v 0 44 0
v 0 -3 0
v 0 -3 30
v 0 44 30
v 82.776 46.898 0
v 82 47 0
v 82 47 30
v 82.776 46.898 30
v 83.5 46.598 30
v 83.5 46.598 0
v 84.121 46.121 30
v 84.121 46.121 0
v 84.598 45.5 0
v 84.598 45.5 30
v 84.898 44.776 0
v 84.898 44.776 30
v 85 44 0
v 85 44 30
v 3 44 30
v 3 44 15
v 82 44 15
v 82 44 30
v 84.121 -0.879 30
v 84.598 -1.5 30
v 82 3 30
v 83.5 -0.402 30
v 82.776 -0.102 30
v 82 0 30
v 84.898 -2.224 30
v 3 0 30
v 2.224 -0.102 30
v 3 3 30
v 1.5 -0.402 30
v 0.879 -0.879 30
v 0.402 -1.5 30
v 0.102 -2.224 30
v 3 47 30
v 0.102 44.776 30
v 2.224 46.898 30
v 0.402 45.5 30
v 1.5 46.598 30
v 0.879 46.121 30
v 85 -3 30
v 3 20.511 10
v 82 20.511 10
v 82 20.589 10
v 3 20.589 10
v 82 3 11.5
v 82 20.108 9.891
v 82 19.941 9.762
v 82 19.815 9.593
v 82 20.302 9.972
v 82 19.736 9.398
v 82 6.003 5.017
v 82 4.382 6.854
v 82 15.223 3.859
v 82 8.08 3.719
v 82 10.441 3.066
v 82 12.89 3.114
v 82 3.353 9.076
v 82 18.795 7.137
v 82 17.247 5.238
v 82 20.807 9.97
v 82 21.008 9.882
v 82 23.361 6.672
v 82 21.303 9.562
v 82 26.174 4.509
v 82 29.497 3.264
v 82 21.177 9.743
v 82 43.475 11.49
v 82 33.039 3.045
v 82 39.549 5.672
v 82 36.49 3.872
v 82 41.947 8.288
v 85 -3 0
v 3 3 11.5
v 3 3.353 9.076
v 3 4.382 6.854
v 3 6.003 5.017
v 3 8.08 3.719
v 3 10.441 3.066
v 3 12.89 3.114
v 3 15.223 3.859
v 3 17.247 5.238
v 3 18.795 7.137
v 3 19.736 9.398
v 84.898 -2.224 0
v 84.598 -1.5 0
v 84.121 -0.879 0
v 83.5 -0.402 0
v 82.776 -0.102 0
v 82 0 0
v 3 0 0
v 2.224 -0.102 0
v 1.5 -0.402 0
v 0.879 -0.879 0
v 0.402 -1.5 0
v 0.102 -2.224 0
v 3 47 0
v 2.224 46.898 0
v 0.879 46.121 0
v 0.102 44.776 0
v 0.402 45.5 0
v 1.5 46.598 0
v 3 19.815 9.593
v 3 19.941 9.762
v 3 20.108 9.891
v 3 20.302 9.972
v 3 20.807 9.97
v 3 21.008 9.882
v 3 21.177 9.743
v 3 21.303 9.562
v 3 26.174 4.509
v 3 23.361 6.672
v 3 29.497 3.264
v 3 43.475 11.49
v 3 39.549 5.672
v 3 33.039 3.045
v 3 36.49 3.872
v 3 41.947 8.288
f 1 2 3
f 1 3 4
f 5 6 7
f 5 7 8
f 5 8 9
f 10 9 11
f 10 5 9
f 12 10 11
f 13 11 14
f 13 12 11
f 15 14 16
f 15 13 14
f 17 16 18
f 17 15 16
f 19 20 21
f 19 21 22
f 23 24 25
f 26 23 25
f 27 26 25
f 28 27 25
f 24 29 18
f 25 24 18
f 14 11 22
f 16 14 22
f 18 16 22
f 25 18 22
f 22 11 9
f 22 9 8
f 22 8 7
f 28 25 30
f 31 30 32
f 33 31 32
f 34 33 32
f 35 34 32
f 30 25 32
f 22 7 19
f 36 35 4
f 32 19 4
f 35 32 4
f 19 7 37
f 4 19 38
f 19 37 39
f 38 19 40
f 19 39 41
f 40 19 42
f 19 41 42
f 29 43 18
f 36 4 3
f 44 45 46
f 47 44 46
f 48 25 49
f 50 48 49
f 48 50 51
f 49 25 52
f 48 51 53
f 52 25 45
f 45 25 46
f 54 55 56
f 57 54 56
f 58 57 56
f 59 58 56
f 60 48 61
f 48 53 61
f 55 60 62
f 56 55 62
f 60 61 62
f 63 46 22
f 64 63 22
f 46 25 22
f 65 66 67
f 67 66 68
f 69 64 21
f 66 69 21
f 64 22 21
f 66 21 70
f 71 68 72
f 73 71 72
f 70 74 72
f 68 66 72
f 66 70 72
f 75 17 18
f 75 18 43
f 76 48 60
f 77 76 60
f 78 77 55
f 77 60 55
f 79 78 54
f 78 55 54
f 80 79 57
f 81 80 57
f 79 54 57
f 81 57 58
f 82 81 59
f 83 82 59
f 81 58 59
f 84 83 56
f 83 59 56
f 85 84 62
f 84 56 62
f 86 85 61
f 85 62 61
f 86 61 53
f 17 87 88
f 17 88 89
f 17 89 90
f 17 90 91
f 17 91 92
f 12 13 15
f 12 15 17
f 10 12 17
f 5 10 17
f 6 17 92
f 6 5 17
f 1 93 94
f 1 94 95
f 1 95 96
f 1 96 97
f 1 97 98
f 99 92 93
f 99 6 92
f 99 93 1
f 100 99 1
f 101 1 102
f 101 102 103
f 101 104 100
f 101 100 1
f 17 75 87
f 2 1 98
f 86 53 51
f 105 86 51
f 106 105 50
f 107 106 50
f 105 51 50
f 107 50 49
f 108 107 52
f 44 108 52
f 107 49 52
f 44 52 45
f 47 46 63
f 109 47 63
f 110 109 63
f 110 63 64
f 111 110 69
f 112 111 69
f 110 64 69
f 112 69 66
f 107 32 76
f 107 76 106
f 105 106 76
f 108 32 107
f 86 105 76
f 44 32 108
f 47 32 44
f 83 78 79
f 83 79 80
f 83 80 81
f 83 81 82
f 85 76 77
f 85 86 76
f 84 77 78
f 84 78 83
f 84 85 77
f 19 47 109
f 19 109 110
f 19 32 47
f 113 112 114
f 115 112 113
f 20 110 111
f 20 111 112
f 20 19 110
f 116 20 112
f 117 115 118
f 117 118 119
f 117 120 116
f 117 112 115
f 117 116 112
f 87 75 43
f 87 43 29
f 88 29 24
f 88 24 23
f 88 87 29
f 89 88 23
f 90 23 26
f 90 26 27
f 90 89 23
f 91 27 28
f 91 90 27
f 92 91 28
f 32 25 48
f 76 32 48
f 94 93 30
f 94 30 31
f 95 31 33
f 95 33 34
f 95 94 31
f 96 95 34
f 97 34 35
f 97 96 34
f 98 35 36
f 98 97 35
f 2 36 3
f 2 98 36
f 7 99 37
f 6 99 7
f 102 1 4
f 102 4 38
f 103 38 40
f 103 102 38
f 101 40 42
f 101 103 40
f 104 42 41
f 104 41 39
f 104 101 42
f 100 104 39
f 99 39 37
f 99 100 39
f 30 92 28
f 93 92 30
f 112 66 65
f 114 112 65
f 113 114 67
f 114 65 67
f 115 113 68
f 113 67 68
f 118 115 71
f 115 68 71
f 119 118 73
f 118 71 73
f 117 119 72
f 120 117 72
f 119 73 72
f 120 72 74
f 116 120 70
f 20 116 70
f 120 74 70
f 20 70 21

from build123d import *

# Parameters (mm, degrees)
BOSS_EXTRUDE1_DEPTH = 30
CUT_EXTRUDE1_START  = -3
CUT_EXTRUDE1_DEPTH  = 79


with BuildPart() as part:
    # Sketch1 → Boss-Extrude1 (new body)
    with BuildSketch(Plane.XY):
        with BuildLine():
            Line((3, 47), (82, 47))
            ThreePointArc((82, 47), (84.121320344, 46.121320344), (85, 44))
            Line((85, 44), (85, -3))
            ThreePointArc((85, -3), (84.121320344, -0.878679656), (82, 0))
            Line((82, 0), (3, 0))
            ThreePointArc((3, 0), (0.878679656, -0.878679656), (0, -3))
            Line((0, -3), (0, 44))
            ThreePointArc((0, 44), (0.878679656, 46.121320344), (3, 47))
        make_face()
    extrude(amount=BOSS_EXTRUDE1_DEPTH)

    # Sketch2 → Cut-Extrude1 (cut)
    with BuildSketch(Plane(origin=(85, 0, 0), x_dir=(0, 0, -1), z_dir=(1, 0, 0)).offset(CUT_EXTRUDE1_START)):
        with BuildLine():
            Line((-30, 3), (-11.5, 3))
            ThreePointArc((-11.5, 3), (-3.066269455, 10.440665731), (-9.397849462, 19.735955507))
            ThreePointArc((-9.397849462, 19.735955507), (-9.831775106, 20.020329144), (-10, 20.511104261))
            Line((-10, 20.511104261), (-10, 20.58947854))
            ThreePointArc((-10, 20.58947854), (-9.881909085, 21.007808553), (-9.5625, 21.302636131))
            ThreePointArc((-9.5625, 21.302636131), (-3.330202092, 34.795678233), (-15, 44))
            Line((-15, 44), (-30, 44))
            Line((-30, 44), (-30, 3))
        make_face()
    extrude(amount=-CUT_EXTRUDE1_DEPTH, mode=Mode.SUBTRACT)


solid = part.part
